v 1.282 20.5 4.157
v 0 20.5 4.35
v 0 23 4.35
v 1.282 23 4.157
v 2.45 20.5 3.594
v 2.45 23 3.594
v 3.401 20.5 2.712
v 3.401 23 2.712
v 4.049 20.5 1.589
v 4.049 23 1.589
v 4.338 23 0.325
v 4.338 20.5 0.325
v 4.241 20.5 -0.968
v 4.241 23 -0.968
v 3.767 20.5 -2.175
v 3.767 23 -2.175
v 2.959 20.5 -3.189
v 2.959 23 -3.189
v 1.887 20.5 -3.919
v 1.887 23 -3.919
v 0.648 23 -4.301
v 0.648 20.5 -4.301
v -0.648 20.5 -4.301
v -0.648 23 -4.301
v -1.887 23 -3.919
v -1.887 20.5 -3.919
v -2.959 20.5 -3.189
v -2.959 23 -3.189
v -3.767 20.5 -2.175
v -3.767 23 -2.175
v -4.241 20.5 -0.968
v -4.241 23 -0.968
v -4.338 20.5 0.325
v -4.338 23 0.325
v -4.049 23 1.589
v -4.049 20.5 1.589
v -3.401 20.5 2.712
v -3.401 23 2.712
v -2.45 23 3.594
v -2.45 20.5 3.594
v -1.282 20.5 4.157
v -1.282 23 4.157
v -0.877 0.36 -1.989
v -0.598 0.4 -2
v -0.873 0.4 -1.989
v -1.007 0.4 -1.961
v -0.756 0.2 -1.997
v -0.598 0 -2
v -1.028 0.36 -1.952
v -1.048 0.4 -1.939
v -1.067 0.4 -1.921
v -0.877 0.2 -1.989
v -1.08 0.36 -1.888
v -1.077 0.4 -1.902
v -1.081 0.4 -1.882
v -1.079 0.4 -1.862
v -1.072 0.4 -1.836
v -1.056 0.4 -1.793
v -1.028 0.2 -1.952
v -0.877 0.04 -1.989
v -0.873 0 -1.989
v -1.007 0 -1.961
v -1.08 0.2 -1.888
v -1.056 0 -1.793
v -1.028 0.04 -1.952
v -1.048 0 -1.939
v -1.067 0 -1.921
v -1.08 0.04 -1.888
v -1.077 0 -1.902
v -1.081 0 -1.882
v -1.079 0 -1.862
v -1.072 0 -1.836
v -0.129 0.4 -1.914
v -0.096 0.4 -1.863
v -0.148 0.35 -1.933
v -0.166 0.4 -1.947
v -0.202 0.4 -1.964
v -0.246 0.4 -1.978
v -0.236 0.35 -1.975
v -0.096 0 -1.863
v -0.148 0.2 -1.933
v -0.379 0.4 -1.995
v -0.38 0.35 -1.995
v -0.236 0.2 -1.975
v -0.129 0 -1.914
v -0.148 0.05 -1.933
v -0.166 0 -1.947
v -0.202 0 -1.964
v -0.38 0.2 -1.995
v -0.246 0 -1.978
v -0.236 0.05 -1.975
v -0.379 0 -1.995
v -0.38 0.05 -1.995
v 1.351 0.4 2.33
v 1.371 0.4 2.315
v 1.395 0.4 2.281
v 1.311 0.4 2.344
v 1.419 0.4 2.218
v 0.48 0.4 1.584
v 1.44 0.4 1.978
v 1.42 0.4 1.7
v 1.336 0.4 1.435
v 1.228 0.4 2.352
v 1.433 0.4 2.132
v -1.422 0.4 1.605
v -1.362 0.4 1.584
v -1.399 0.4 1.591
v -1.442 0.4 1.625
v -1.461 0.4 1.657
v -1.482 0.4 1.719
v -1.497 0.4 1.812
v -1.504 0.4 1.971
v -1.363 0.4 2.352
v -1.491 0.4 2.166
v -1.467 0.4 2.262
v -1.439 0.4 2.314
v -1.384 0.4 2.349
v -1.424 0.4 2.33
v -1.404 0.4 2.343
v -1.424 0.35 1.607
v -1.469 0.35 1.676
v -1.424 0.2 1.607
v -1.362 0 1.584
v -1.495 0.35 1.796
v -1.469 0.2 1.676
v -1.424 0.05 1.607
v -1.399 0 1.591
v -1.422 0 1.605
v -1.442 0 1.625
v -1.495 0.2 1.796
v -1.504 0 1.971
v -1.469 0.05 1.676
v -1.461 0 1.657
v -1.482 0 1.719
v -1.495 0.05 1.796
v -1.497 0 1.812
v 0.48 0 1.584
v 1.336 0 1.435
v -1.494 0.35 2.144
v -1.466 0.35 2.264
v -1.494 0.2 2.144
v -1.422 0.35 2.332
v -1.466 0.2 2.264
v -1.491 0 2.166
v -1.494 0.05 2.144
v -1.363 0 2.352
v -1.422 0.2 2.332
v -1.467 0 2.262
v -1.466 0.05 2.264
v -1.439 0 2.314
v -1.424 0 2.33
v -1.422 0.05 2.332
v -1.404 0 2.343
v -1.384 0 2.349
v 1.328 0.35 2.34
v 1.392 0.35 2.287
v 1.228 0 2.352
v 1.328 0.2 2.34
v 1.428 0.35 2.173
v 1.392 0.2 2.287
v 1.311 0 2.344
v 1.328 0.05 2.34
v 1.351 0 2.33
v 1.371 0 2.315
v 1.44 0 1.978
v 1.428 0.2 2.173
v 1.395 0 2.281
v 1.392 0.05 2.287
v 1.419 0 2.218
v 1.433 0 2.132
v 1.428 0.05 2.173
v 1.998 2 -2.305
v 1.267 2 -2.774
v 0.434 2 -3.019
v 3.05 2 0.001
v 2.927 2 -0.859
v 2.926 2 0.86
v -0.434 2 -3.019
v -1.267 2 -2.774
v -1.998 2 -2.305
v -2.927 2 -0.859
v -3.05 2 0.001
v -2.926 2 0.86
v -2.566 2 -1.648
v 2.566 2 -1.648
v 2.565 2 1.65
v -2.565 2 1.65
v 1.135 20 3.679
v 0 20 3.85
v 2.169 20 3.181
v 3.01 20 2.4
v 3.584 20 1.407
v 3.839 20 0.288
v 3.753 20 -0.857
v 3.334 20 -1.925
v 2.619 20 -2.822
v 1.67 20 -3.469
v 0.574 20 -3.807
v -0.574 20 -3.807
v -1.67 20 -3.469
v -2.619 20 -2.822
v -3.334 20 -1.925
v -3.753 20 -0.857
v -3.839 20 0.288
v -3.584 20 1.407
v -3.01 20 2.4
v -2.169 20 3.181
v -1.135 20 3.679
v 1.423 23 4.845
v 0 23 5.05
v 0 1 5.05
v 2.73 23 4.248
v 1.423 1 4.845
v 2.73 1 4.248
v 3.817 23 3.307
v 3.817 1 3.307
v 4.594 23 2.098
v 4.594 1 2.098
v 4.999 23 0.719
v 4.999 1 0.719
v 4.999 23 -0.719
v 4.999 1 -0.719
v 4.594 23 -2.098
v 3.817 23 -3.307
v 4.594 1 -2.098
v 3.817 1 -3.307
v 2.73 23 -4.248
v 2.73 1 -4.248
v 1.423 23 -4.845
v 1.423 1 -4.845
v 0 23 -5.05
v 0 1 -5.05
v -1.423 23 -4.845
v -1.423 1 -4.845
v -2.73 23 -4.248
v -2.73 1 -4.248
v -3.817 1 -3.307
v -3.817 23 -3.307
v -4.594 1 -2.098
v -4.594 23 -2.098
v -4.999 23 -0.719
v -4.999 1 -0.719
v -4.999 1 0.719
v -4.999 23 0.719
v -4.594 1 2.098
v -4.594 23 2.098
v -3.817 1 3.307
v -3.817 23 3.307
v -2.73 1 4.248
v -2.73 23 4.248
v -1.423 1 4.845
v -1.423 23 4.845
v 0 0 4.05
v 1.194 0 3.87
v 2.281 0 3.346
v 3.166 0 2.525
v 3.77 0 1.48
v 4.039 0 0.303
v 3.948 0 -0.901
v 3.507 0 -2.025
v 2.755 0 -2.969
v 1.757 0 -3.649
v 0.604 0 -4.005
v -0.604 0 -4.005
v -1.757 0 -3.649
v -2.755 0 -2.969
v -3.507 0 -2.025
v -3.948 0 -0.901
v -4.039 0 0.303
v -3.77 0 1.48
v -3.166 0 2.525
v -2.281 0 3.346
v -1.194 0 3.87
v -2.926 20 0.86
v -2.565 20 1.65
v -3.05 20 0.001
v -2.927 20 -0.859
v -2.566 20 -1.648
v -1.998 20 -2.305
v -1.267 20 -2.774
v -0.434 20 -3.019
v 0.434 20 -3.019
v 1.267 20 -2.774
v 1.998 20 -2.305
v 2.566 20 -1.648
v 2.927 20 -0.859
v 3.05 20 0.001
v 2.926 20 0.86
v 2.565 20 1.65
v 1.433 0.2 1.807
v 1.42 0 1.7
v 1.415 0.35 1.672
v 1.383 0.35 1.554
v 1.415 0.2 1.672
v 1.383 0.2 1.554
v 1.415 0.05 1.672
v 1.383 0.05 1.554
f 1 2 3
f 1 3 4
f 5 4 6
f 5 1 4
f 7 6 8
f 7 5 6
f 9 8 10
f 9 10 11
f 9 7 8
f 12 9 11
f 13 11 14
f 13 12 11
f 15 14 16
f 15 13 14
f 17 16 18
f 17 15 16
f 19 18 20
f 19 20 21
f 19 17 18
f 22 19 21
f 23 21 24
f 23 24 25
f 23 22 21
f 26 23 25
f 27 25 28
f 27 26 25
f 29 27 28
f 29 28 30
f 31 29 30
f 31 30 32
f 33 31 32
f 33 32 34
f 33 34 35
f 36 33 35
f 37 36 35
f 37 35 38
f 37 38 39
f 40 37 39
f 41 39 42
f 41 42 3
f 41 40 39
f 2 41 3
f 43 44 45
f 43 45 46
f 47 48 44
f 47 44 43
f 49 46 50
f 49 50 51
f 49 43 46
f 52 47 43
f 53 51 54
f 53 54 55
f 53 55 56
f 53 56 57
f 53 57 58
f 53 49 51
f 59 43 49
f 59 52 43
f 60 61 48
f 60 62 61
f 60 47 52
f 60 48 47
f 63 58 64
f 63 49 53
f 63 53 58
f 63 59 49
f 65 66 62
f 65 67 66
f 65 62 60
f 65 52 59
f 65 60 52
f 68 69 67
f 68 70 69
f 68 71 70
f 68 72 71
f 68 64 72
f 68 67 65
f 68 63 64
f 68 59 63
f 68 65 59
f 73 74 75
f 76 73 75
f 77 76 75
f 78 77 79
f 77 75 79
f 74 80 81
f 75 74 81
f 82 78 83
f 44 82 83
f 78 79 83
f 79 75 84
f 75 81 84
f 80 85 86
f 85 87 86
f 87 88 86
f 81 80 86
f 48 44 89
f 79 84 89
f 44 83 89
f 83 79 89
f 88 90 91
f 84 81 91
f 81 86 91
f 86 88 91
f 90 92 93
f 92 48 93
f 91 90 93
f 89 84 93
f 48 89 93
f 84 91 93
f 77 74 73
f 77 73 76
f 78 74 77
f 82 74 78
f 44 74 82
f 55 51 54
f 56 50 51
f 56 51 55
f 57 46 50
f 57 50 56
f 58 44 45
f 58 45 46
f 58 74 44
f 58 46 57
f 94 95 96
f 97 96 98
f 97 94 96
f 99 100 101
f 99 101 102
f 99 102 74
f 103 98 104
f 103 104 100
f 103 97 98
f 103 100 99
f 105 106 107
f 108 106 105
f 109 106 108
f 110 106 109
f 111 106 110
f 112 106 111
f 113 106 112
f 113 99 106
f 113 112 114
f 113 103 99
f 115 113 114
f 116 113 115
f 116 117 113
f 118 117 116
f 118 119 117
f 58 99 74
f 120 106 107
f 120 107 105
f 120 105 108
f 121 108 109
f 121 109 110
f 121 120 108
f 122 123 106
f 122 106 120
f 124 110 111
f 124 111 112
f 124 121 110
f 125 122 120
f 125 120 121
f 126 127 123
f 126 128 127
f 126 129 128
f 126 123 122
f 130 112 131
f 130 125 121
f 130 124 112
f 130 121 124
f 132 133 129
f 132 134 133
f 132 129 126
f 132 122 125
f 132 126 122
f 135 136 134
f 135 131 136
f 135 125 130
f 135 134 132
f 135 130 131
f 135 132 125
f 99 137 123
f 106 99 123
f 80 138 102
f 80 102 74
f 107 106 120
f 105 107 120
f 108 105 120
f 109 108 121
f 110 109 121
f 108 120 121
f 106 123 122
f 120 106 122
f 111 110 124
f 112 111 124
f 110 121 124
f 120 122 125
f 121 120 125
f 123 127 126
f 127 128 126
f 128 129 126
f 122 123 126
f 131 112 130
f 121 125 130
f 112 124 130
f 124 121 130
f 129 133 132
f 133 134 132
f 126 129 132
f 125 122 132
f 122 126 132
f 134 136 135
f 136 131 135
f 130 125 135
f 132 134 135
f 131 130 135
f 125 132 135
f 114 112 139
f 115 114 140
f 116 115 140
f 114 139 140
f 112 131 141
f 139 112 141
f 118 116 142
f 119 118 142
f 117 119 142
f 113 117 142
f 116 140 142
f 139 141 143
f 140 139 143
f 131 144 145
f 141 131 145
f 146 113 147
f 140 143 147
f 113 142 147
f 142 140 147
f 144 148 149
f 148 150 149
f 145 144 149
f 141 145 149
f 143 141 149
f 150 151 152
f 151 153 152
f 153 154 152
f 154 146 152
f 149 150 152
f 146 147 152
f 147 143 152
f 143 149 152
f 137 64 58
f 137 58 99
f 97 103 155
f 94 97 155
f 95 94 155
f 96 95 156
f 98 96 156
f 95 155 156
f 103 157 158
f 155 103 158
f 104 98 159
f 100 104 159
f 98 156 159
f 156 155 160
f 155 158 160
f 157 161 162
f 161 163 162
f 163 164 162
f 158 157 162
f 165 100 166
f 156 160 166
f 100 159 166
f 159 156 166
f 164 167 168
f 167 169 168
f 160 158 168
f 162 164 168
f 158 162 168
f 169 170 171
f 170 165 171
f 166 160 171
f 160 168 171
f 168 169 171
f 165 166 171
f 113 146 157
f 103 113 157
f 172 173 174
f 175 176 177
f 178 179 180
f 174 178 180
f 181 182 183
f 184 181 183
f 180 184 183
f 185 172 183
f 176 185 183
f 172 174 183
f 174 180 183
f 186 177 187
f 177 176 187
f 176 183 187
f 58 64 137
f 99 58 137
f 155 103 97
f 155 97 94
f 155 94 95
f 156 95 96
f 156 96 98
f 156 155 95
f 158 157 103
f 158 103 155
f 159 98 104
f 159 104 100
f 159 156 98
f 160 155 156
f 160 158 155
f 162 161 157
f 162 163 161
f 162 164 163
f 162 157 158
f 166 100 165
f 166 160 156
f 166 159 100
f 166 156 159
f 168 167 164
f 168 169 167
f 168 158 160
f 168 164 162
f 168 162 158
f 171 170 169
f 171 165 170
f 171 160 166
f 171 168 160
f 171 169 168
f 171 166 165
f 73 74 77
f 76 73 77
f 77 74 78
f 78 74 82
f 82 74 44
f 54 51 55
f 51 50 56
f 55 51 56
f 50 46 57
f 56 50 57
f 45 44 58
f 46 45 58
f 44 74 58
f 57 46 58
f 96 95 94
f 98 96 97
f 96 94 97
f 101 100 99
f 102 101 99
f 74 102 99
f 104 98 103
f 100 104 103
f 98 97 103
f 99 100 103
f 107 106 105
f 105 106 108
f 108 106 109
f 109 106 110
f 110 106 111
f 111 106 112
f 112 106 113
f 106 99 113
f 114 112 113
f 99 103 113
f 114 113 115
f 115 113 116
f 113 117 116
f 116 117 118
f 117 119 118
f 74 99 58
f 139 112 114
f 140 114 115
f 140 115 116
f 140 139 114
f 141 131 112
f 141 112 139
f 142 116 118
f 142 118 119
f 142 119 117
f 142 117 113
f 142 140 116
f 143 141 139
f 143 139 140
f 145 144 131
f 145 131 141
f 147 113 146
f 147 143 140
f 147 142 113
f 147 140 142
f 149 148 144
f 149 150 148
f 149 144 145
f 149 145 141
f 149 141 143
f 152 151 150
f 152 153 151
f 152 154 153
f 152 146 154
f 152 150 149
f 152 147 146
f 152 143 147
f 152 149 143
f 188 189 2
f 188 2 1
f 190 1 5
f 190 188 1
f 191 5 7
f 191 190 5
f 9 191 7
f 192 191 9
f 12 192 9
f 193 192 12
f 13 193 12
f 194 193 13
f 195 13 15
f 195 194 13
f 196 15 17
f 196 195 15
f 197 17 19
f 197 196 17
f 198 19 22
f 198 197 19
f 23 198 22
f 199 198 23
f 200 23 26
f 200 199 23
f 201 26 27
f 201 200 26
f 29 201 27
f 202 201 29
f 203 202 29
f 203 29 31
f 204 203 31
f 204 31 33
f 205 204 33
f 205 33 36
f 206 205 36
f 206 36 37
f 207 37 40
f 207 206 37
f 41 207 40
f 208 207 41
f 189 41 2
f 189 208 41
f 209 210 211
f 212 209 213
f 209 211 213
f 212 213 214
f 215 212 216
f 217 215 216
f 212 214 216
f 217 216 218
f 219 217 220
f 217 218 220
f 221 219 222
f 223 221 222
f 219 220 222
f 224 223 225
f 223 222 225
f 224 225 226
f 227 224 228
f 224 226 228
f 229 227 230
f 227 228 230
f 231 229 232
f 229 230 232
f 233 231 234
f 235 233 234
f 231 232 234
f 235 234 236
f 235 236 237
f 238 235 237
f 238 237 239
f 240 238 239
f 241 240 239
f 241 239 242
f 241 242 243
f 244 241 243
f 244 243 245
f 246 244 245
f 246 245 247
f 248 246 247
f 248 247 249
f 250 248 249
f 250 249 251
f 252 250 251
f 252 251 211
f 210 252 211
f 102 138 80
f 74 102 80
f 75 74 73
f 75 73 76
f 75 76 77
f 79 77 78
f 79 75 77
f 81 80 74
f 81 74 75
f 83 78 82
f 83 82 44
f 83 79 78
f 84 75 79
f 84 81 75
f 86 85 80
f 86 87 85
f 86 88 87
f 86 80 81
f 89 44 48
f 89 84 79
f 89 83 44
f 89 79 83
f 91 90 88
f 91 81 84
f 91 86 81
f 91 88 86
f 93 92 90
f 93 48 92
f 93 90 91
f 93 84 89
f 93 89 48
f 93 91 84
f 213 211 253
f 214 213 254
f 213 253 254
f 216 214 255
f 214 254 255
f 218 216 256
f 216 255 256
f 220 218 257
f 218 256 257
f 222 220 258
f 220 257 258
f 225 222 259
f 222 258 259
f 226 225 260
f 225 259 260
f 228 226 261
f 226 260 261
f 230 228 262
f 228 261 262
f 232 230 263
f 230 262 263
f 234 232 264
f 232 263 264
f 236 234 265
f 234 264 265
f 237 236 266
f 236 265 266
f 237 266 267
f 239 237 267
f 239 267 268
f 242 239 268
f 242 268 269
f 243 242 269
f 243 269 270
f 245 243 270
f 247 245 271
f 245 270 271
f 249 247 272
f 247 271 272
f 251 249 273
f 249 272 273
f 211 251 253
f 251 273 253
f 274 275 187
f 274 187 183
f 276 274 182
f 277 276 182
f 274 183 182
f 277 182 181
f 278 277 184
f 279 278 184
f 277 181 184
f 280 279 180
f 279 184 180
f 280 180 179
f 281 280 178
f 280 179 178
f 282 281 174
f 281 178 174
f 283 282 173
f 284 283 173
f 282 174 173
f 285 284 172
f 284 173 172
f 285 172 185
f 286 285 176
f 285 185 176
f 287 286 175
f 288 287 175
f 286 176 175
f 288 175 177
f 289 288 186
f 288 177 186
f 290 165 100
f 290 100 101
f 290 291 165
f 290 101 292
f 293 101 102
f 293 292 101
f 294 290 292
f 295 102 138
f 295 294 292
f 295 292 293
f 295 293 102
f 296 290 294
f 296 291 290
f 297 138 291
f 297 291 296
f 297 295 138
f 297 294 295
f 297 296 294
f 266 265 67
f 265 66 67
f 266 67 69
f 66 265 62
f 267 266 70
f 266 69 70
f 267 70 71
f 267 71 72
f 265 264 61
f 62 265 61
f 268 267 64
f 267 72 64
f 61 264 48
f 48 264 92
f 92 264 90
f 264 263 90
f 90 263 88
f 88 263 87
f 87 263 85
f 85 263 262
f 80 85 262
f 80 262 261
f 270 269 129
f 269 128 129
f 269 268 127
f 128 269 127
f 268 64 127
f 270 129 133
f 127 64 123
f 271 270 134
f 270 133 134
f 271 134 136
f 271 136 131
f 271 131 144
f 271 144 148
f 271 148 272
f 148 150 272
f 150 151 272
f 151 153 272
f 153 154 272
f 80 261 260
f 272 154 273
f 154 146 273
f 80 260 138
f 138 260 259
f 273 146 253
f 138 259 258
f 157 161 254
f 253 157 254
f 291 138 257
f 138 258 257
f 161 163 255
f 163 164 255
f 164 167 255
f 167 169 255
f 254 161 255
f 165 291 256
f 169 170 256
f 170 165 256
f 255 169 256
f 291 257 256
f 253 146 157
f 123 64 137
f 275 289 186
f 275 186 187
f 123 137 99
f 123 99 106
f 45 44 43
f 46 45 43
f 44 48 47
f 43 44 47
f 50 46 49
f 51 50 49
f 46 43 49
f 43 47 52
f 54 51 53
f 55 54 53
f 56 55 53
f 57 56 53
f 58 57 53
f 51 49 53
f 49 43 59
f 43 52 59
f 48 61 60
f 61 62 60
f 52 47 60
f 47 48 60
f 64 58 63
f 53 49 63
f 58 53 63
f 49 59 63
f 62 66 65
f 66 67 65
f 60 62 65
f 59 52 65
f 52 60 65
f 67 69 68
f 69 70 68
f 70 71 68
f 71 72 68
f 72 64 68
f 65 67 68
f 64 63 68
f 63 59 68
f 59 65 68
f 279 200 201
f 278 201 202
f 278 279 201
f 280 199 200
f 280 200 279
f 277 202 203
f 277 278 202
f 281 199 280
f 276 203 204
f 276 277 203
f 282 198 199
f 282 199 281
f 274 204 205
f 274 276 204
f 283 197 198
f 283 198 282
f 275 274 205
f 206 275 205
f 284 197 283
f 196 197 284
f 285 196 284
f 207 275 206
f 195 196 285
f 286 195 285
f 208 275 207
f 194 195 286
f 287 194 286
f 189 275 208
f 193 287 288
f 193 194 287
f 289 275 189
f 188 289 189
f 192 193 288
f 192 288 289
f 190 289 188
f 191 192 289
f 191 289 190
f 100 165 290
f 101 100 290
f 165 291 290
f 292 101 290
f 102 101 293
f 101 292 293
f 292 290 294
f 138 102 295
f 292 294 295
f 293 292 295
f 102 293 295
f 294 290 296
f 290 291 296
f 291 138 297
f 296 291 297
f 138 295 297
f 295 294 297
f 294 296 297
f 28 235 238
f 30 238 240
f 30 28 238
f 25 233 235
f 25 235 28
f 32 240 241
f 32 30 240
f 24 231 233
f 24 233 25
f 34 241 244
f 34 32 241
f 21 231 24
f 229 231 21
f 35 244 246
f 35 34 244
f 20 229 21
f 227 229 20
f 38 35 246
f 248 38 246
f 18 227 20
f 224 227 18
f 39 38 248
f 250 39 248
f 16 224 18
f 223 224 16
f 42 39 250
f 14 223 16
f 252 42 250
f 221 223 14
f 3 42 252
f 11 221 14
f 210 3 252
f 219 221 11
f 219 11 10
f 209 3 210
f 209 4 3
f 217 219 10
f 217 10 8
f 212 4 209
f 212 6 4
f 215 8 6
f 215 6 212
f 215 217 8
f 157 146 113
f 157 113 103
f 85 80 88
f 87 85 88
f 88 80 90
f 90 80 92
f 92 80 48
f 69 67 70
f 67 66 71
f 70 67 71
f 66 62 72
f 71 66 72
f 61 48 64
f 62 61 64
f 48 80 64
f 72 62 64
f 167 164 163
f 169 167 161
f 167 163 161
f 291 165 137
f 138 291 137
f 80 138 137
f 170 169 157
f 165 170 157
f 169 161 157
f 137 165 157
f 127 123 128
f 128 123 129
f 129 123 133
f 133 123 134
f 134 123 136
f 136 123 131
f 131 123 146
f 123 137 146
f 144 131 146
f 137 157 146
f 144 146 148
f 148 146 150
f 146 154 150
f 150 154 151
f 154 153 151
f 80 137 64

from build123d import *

# Parameters (mm, degrees)
SKETCH1_R           = 5.05
BOSS_EXTRUDE1_DEPTH = 20
SKETCH2_R           = 5.05
BOSS_EXTRUDE2_DEPTH = 2
SKETCH4_R           = 5.05
SKETCH4_R_2         = 4.35
BOSS_EXTRUDE3_DEPTH = 3
CHAMFER1_SIZE       = 1
CHAMFER2_SIZE       = 0.5
CUT_EXTRUDE1_DEPTH  = 0.4
BOSS_EXTRUDE4_DEPTH = 0.4


with BuildPart() as part:
    # Sketch1 → Boss-Extrude1 (new body)
    with BuildSketch(Plane(origin=(0, 0, 0), x_dir=(1, 0, 0), z_dir=(0, 1, 0))):
        Circle(SKETCH1_R)
        with BuildLine():
            Line((2.565151068, -1.65), (-2.565151068, -1.65))
            ThreePointArc((-2.565151068, -1.65), (0, 3.05), (2.565151068, -1.65))
        make_face(mode=Mode.SUBTRACT)
    extrude(amount=BOSS_EXTRUDE1_DEPTH)

    # Sketch2 → Boss-Extrude2 (add)
    with BuildSketch(Plane.XZ):
        Circle(SKETCH2_R)
    extrude(amount=-BOSS_EXTRUDE2_DEPTH)

    # Sketch4 → Boss-Extrude3 (add)
    with BuildSketch(Plane(origin=(0, 20, 0), x_dir=(1, 0, 0), z_dir=(0, 1, 0))):
        Circle(SKETCH4_R)
        Circle(SKETCH4_R_2, mode=Mode.SUBTRACT)
    extrude(amount=BOSS_EXTRUDE3_DEPTH)

    # Chamfer1
    chamfer1_edges = [part.edges().sort_by_distance(p)[0] for p in [
        (-5.05, 0, 0),
    ]]
    chamfer(chamfer1_edges, length=CHAMFER1_SIZE)

    # Chamfer2
    chamfer2_edges = [part.edges().sort_by_distance(p)[0] for p in [
        (-4.35, 20, 0),
    ]]
    chamfer(chamfer2_edges, length=CHAMFER2_SIZE)

    # Sketch5 → Cut-Extrude1 (cut)
    with BuildSketch(Plane.XZ):
        with BuildLine():
            add(Edge.make_bspline(
                [(1.439948587, 1.977857971), (1.439594418, 1.947179654), (1.438935589, 1.890111525), (1.433429057, 1.809777002), (1.4270814, 1.738210124), (1.415791341, 1.673161074), (1.401758418, 1.611967409), (1.383694724, 1.553469012), (1.360250697, 1.495084377), (1.344290938, 1.455538989), (1.3359523, 1.434877358)],
                knots=[0, 0, 0, 0, 1.319916943, 2.455323438, 3.464378594, 4.409964608, 5.293693962, 6.16476111, 7.041126412, 8, 8, 8, 8], degree=3))
            Line((1.3359523, 1.434877358), (-0.095996572, -1.863004891))
            add(Edge.make_bspline(
                [(-0.095996572, -1.863004891), (-0.103079107, -1.876394255), (-0.116801963, -1.902336991), (-0.147305, -1.934724111), (-0.187086931, -1.960386537), (-0.239296836, -1.977294348), (-0.304915975, -1.988596283), (-0.385818734, -1.996283375), (-0.48528424, -1.999725841), (-0.557978054, -1.999902688), (-0.597978649, -2)],
                knots=[0, 0, 0, 0, 0.659157871, 1.277159907, 1.919215029, 2.706578835, 3.654550683, 4.825028497, 6.252935909, 8, 8, 8, 8], degree=3))
            add(Edge.make_bspline(
                [(-0.597978649, -2), (-0.625646307, -1.999758185), (-0.678321934, -1.9992978), (-0.752656112, -1.997243092), (-0.818062696, -1.994695895), (-0.888304548, -1.988430727), (-0.958433008, -1.977833702), (-1.023374206, -1.957539704), (-1.066059389, -1.928063191), (-1.084465051, -1.886594158), (-1.075244849, -1.84032981), (-1.062893647, -1.810018016), (-1.055962297, -1.793007391)],
                knots=[0, 0, 0, 0, 1.340733497, 2.552582398, 3.603595853, 4.511719735, 5.969543587, 7.032159891, 7.791487141, 8.406546244, 9.105772362, 10, 10, 10, 10], degree=3))
            Line((-1.055962297, -1.793007391), (0.479982862, 1.583872038))
            Line((0.479982862, 1.583872038), (-1.361951372, 1.583872038))
            add(Edge.make_bspline(
                [(-1.361951372, 1.583872038), (-1.373186676, 1.58506365), (-1.395682225, 1.587449518), (-1.426552523, 1.606459502), (-1.451528664, 1.636792347), (-1.471697595, 1.678580357), (-1.485840367, 1.732872878), (-1.496339641, 1.800191364), (-1.503298216, 1.881054757), (-1.503720072, 1.939510124), (-1.503946302, 1.970858221)],
                knots=[0, 0, 0, 0, 0.598321547, 1.197971223, 1.880978557, 2.678740619, 3.66131666, 4.872497088, 6.322801311, 8, 8, 8, 8], degree=3))
            add(Edge.make_bspline(
                [(-1.503946302, 1.970858221), (-1.503286786, 2.002200854), (-1.502071109, 2.059974382), (-1.495545332, 2.140283922), (-1.483914888, 2.206907787), (-1.468596712, 2.261555537), (-1.448030384, 2.302497667), (-1.424522994, 2.332809913), (-1.394541503, 2.348890816), (-1.373440846, 2.350863809), (-1.362951336, 2.351844618)],
                knots=[0, 0, 0, 0, 1.704210039, 3.141351516, 4.374755511, 5.377959938, 6.212691607, 6.855400814, 7.430999487, 8, 8, 8, 8], degree=3))
            Line((-1.362951336, 2.351844618), (1.227956156, 2.351844618))
            add(Edge.make_bspline(
                [(1.227956156, 2.351844618), (1.246335593, 2.351328223), (1.280027794, 2.350381596), (1.326933096, 2.342161898), (1.367855013, 2.323363855), (1.395052486, 2.284862428), (1.416399912, 2.234640447), (1.430232996, 2.166777773), (1.438775132, 2.079423303), (1.439528445, 2.014222225), (1.439948587, 1.977857971)],
                knots=[0, 0, 0, 0, 0.878550269, 1.610511387, 2.273921182, 2.966412775, 3.802073521, 4.881614106, 6.260799084, 8, 8, 8, 8], degree=3))
        make_face()
    extrude(amount=-CUT_EXTRUDE1_DEPTH, mode=Mode.SUBTRACT)


with BuildPart() as body_2:
    # Sketch5<2> → Boss-Extrude4 (new body)
    with BuildSketch(Plane.XZ):
        with BuildLine():
            add(Edge.make_bspline(
                [(1.439948587, 1.977857971), (1.439594418, 1.947179654), (1.438935589, 1.890111525), (1.433429057, 1.809777002), (1.4270814, 1.738210124), (1.415791341, 1.673161074), (1.401758418, 1.611967409), (1.383694724, 1.553469012), (1.360250697, 1.495084377), (1.344290938, 1.455538989), (1.3359523, 1.434877358)],
                knots=[0, 0, 0, 0, 1.319916943, 2.455323438, 3.464378594, 4.409964608, 5.293693962, 6.16476111, 7.041126412, 8, 8, 8, 8], degree=3))
            Line((1.3359523, 1.434877358), (-0.095996572, -1.863004891))
            add(Edge.make_bspline(
                [(-0.095996572, -1.863004891), (-0.103079107, -1.876394255), (-0.116801963, -1.902336991), (-0.147305, -1.934724111), (-0.187086931, -1.960386537), (-0.239296836, -1.977294348), (-0.304915975, -1.988596283), (-0.385818734, -1.996283375), (-0.48528424, -1.999725841), (-0.557978054, -1.999902688), (-0.597978649, -2)],
                knots=[0, 0, 0, 0, 0.659157871, 1.277159907, 1.919215029, 2.706578835, 3.654550683, 4.825028497, 6.252935909, 8, 8, 8, 8], degree=3))
            add(Edge.make_bspline(
                [(-0.597978649, -2), (-0.625646307, -1.999758185), (-0.678321934, -1.9992978), (-0.752656112, -1.997243092), (-0.818062696, -1.994695895), (-0.888304548, -1.988430727), (-0.958433008, -1.977833702), (-1.023374206, -1.957539704), (-1.066059389, -1.928063191), (-1.084465051, -1.886594158), (-1.075244849, -1.84032981), (-1.062893647, -1.810018016), (-1.055962297, -1.793007391)],
                knots=[0, 0, 0, 0, 1.340733497, 2.552582398, 3.603595853, 4.511719735, 5.969543587, 7.032159891, 7.791487141, 8.406546244, 9.105772362, 10, 10, 10, 10], degree=3))
            Line((-1.055962297, -1.793007391), (0.479982862, 1.583872038))
            Line((0.479982862, 1.583872038), (-1.361951372, 1.583872038))
            add(Edge.make_bspline(
                [(-1.361951372, 1.583872038), (-1.373186676, 1.58506365), (-1.395682225, 1.587449518), (-1.426552523, 1.606459502), (-1.451528664, 1.636792347), (-1.471697595, 1.678580357), (-1.485840367, 1.732872878), (-1.496339641, 1.800191364), (-1.503298216, 1.881054757), (-1.503720072, 1.939510124), (-1.503946302, 1.970858221)],
                knots=[0, 0, 0, 0, 0.598321547, 1.197971223, 1.880978557, 2.678740619, 3.66131666, 4.872497088, 6.322801311, 8, 8, 8, 8], degree=3))
            add(Edge.make_bspline(
                [(-1.503946302, 1.970858221), (-1.503286786, 2.002200854), (-1.502071109, 2.059974382), (-1.495545332, 2.140283922), (-1.483914888, 2.206907787), (-1.468596712, 2.261555537), (-1.448030384, 2.302497667), (-1.424522994, 2.332809913), (-1.394541503, 2.348890816), (-1.373440846, 2.350863809), (-1.362951336, 2.351844618)],
                knots=[0, 0, 0, 0, 1.704210039, 3.141351516, 4.374755511, 5.377959938, 6.212691607, 6.855400814, 7.430999487, 8, 8, 8, 8], degree=3))
            Line((-1.362951336, 2.351844618), (1.227956156, 2.351844618))
            add(Edge.make_bspline(
                [(1.227956156, 2.351844618), (1.246335593, 2.351328223), (1.280027794, 2.350381596), (1.326933096, 2.342161898), (1.367855013, 2.323363855), (1.395052486, 2.284862428), (1.416399912, 2.234640447), (1.430232996, 2.166777773), (1.438775132, 2.079423303), (1.439528445, 2.014222225), (1.439948587, 1.977857971)],
                knots=[0, 0, 0, 0, 0.878550269, 1.610511387, 2.273921182, 2.966412775, 3.802073521, 4.881614106, 6.260799084, 8, 8, 8, 8], degree=3))
        make_face()
    extrude(amount=-BOSS_EXTRUDE4_DEPTH)


solid = Compound([part.part, body_2.part])
